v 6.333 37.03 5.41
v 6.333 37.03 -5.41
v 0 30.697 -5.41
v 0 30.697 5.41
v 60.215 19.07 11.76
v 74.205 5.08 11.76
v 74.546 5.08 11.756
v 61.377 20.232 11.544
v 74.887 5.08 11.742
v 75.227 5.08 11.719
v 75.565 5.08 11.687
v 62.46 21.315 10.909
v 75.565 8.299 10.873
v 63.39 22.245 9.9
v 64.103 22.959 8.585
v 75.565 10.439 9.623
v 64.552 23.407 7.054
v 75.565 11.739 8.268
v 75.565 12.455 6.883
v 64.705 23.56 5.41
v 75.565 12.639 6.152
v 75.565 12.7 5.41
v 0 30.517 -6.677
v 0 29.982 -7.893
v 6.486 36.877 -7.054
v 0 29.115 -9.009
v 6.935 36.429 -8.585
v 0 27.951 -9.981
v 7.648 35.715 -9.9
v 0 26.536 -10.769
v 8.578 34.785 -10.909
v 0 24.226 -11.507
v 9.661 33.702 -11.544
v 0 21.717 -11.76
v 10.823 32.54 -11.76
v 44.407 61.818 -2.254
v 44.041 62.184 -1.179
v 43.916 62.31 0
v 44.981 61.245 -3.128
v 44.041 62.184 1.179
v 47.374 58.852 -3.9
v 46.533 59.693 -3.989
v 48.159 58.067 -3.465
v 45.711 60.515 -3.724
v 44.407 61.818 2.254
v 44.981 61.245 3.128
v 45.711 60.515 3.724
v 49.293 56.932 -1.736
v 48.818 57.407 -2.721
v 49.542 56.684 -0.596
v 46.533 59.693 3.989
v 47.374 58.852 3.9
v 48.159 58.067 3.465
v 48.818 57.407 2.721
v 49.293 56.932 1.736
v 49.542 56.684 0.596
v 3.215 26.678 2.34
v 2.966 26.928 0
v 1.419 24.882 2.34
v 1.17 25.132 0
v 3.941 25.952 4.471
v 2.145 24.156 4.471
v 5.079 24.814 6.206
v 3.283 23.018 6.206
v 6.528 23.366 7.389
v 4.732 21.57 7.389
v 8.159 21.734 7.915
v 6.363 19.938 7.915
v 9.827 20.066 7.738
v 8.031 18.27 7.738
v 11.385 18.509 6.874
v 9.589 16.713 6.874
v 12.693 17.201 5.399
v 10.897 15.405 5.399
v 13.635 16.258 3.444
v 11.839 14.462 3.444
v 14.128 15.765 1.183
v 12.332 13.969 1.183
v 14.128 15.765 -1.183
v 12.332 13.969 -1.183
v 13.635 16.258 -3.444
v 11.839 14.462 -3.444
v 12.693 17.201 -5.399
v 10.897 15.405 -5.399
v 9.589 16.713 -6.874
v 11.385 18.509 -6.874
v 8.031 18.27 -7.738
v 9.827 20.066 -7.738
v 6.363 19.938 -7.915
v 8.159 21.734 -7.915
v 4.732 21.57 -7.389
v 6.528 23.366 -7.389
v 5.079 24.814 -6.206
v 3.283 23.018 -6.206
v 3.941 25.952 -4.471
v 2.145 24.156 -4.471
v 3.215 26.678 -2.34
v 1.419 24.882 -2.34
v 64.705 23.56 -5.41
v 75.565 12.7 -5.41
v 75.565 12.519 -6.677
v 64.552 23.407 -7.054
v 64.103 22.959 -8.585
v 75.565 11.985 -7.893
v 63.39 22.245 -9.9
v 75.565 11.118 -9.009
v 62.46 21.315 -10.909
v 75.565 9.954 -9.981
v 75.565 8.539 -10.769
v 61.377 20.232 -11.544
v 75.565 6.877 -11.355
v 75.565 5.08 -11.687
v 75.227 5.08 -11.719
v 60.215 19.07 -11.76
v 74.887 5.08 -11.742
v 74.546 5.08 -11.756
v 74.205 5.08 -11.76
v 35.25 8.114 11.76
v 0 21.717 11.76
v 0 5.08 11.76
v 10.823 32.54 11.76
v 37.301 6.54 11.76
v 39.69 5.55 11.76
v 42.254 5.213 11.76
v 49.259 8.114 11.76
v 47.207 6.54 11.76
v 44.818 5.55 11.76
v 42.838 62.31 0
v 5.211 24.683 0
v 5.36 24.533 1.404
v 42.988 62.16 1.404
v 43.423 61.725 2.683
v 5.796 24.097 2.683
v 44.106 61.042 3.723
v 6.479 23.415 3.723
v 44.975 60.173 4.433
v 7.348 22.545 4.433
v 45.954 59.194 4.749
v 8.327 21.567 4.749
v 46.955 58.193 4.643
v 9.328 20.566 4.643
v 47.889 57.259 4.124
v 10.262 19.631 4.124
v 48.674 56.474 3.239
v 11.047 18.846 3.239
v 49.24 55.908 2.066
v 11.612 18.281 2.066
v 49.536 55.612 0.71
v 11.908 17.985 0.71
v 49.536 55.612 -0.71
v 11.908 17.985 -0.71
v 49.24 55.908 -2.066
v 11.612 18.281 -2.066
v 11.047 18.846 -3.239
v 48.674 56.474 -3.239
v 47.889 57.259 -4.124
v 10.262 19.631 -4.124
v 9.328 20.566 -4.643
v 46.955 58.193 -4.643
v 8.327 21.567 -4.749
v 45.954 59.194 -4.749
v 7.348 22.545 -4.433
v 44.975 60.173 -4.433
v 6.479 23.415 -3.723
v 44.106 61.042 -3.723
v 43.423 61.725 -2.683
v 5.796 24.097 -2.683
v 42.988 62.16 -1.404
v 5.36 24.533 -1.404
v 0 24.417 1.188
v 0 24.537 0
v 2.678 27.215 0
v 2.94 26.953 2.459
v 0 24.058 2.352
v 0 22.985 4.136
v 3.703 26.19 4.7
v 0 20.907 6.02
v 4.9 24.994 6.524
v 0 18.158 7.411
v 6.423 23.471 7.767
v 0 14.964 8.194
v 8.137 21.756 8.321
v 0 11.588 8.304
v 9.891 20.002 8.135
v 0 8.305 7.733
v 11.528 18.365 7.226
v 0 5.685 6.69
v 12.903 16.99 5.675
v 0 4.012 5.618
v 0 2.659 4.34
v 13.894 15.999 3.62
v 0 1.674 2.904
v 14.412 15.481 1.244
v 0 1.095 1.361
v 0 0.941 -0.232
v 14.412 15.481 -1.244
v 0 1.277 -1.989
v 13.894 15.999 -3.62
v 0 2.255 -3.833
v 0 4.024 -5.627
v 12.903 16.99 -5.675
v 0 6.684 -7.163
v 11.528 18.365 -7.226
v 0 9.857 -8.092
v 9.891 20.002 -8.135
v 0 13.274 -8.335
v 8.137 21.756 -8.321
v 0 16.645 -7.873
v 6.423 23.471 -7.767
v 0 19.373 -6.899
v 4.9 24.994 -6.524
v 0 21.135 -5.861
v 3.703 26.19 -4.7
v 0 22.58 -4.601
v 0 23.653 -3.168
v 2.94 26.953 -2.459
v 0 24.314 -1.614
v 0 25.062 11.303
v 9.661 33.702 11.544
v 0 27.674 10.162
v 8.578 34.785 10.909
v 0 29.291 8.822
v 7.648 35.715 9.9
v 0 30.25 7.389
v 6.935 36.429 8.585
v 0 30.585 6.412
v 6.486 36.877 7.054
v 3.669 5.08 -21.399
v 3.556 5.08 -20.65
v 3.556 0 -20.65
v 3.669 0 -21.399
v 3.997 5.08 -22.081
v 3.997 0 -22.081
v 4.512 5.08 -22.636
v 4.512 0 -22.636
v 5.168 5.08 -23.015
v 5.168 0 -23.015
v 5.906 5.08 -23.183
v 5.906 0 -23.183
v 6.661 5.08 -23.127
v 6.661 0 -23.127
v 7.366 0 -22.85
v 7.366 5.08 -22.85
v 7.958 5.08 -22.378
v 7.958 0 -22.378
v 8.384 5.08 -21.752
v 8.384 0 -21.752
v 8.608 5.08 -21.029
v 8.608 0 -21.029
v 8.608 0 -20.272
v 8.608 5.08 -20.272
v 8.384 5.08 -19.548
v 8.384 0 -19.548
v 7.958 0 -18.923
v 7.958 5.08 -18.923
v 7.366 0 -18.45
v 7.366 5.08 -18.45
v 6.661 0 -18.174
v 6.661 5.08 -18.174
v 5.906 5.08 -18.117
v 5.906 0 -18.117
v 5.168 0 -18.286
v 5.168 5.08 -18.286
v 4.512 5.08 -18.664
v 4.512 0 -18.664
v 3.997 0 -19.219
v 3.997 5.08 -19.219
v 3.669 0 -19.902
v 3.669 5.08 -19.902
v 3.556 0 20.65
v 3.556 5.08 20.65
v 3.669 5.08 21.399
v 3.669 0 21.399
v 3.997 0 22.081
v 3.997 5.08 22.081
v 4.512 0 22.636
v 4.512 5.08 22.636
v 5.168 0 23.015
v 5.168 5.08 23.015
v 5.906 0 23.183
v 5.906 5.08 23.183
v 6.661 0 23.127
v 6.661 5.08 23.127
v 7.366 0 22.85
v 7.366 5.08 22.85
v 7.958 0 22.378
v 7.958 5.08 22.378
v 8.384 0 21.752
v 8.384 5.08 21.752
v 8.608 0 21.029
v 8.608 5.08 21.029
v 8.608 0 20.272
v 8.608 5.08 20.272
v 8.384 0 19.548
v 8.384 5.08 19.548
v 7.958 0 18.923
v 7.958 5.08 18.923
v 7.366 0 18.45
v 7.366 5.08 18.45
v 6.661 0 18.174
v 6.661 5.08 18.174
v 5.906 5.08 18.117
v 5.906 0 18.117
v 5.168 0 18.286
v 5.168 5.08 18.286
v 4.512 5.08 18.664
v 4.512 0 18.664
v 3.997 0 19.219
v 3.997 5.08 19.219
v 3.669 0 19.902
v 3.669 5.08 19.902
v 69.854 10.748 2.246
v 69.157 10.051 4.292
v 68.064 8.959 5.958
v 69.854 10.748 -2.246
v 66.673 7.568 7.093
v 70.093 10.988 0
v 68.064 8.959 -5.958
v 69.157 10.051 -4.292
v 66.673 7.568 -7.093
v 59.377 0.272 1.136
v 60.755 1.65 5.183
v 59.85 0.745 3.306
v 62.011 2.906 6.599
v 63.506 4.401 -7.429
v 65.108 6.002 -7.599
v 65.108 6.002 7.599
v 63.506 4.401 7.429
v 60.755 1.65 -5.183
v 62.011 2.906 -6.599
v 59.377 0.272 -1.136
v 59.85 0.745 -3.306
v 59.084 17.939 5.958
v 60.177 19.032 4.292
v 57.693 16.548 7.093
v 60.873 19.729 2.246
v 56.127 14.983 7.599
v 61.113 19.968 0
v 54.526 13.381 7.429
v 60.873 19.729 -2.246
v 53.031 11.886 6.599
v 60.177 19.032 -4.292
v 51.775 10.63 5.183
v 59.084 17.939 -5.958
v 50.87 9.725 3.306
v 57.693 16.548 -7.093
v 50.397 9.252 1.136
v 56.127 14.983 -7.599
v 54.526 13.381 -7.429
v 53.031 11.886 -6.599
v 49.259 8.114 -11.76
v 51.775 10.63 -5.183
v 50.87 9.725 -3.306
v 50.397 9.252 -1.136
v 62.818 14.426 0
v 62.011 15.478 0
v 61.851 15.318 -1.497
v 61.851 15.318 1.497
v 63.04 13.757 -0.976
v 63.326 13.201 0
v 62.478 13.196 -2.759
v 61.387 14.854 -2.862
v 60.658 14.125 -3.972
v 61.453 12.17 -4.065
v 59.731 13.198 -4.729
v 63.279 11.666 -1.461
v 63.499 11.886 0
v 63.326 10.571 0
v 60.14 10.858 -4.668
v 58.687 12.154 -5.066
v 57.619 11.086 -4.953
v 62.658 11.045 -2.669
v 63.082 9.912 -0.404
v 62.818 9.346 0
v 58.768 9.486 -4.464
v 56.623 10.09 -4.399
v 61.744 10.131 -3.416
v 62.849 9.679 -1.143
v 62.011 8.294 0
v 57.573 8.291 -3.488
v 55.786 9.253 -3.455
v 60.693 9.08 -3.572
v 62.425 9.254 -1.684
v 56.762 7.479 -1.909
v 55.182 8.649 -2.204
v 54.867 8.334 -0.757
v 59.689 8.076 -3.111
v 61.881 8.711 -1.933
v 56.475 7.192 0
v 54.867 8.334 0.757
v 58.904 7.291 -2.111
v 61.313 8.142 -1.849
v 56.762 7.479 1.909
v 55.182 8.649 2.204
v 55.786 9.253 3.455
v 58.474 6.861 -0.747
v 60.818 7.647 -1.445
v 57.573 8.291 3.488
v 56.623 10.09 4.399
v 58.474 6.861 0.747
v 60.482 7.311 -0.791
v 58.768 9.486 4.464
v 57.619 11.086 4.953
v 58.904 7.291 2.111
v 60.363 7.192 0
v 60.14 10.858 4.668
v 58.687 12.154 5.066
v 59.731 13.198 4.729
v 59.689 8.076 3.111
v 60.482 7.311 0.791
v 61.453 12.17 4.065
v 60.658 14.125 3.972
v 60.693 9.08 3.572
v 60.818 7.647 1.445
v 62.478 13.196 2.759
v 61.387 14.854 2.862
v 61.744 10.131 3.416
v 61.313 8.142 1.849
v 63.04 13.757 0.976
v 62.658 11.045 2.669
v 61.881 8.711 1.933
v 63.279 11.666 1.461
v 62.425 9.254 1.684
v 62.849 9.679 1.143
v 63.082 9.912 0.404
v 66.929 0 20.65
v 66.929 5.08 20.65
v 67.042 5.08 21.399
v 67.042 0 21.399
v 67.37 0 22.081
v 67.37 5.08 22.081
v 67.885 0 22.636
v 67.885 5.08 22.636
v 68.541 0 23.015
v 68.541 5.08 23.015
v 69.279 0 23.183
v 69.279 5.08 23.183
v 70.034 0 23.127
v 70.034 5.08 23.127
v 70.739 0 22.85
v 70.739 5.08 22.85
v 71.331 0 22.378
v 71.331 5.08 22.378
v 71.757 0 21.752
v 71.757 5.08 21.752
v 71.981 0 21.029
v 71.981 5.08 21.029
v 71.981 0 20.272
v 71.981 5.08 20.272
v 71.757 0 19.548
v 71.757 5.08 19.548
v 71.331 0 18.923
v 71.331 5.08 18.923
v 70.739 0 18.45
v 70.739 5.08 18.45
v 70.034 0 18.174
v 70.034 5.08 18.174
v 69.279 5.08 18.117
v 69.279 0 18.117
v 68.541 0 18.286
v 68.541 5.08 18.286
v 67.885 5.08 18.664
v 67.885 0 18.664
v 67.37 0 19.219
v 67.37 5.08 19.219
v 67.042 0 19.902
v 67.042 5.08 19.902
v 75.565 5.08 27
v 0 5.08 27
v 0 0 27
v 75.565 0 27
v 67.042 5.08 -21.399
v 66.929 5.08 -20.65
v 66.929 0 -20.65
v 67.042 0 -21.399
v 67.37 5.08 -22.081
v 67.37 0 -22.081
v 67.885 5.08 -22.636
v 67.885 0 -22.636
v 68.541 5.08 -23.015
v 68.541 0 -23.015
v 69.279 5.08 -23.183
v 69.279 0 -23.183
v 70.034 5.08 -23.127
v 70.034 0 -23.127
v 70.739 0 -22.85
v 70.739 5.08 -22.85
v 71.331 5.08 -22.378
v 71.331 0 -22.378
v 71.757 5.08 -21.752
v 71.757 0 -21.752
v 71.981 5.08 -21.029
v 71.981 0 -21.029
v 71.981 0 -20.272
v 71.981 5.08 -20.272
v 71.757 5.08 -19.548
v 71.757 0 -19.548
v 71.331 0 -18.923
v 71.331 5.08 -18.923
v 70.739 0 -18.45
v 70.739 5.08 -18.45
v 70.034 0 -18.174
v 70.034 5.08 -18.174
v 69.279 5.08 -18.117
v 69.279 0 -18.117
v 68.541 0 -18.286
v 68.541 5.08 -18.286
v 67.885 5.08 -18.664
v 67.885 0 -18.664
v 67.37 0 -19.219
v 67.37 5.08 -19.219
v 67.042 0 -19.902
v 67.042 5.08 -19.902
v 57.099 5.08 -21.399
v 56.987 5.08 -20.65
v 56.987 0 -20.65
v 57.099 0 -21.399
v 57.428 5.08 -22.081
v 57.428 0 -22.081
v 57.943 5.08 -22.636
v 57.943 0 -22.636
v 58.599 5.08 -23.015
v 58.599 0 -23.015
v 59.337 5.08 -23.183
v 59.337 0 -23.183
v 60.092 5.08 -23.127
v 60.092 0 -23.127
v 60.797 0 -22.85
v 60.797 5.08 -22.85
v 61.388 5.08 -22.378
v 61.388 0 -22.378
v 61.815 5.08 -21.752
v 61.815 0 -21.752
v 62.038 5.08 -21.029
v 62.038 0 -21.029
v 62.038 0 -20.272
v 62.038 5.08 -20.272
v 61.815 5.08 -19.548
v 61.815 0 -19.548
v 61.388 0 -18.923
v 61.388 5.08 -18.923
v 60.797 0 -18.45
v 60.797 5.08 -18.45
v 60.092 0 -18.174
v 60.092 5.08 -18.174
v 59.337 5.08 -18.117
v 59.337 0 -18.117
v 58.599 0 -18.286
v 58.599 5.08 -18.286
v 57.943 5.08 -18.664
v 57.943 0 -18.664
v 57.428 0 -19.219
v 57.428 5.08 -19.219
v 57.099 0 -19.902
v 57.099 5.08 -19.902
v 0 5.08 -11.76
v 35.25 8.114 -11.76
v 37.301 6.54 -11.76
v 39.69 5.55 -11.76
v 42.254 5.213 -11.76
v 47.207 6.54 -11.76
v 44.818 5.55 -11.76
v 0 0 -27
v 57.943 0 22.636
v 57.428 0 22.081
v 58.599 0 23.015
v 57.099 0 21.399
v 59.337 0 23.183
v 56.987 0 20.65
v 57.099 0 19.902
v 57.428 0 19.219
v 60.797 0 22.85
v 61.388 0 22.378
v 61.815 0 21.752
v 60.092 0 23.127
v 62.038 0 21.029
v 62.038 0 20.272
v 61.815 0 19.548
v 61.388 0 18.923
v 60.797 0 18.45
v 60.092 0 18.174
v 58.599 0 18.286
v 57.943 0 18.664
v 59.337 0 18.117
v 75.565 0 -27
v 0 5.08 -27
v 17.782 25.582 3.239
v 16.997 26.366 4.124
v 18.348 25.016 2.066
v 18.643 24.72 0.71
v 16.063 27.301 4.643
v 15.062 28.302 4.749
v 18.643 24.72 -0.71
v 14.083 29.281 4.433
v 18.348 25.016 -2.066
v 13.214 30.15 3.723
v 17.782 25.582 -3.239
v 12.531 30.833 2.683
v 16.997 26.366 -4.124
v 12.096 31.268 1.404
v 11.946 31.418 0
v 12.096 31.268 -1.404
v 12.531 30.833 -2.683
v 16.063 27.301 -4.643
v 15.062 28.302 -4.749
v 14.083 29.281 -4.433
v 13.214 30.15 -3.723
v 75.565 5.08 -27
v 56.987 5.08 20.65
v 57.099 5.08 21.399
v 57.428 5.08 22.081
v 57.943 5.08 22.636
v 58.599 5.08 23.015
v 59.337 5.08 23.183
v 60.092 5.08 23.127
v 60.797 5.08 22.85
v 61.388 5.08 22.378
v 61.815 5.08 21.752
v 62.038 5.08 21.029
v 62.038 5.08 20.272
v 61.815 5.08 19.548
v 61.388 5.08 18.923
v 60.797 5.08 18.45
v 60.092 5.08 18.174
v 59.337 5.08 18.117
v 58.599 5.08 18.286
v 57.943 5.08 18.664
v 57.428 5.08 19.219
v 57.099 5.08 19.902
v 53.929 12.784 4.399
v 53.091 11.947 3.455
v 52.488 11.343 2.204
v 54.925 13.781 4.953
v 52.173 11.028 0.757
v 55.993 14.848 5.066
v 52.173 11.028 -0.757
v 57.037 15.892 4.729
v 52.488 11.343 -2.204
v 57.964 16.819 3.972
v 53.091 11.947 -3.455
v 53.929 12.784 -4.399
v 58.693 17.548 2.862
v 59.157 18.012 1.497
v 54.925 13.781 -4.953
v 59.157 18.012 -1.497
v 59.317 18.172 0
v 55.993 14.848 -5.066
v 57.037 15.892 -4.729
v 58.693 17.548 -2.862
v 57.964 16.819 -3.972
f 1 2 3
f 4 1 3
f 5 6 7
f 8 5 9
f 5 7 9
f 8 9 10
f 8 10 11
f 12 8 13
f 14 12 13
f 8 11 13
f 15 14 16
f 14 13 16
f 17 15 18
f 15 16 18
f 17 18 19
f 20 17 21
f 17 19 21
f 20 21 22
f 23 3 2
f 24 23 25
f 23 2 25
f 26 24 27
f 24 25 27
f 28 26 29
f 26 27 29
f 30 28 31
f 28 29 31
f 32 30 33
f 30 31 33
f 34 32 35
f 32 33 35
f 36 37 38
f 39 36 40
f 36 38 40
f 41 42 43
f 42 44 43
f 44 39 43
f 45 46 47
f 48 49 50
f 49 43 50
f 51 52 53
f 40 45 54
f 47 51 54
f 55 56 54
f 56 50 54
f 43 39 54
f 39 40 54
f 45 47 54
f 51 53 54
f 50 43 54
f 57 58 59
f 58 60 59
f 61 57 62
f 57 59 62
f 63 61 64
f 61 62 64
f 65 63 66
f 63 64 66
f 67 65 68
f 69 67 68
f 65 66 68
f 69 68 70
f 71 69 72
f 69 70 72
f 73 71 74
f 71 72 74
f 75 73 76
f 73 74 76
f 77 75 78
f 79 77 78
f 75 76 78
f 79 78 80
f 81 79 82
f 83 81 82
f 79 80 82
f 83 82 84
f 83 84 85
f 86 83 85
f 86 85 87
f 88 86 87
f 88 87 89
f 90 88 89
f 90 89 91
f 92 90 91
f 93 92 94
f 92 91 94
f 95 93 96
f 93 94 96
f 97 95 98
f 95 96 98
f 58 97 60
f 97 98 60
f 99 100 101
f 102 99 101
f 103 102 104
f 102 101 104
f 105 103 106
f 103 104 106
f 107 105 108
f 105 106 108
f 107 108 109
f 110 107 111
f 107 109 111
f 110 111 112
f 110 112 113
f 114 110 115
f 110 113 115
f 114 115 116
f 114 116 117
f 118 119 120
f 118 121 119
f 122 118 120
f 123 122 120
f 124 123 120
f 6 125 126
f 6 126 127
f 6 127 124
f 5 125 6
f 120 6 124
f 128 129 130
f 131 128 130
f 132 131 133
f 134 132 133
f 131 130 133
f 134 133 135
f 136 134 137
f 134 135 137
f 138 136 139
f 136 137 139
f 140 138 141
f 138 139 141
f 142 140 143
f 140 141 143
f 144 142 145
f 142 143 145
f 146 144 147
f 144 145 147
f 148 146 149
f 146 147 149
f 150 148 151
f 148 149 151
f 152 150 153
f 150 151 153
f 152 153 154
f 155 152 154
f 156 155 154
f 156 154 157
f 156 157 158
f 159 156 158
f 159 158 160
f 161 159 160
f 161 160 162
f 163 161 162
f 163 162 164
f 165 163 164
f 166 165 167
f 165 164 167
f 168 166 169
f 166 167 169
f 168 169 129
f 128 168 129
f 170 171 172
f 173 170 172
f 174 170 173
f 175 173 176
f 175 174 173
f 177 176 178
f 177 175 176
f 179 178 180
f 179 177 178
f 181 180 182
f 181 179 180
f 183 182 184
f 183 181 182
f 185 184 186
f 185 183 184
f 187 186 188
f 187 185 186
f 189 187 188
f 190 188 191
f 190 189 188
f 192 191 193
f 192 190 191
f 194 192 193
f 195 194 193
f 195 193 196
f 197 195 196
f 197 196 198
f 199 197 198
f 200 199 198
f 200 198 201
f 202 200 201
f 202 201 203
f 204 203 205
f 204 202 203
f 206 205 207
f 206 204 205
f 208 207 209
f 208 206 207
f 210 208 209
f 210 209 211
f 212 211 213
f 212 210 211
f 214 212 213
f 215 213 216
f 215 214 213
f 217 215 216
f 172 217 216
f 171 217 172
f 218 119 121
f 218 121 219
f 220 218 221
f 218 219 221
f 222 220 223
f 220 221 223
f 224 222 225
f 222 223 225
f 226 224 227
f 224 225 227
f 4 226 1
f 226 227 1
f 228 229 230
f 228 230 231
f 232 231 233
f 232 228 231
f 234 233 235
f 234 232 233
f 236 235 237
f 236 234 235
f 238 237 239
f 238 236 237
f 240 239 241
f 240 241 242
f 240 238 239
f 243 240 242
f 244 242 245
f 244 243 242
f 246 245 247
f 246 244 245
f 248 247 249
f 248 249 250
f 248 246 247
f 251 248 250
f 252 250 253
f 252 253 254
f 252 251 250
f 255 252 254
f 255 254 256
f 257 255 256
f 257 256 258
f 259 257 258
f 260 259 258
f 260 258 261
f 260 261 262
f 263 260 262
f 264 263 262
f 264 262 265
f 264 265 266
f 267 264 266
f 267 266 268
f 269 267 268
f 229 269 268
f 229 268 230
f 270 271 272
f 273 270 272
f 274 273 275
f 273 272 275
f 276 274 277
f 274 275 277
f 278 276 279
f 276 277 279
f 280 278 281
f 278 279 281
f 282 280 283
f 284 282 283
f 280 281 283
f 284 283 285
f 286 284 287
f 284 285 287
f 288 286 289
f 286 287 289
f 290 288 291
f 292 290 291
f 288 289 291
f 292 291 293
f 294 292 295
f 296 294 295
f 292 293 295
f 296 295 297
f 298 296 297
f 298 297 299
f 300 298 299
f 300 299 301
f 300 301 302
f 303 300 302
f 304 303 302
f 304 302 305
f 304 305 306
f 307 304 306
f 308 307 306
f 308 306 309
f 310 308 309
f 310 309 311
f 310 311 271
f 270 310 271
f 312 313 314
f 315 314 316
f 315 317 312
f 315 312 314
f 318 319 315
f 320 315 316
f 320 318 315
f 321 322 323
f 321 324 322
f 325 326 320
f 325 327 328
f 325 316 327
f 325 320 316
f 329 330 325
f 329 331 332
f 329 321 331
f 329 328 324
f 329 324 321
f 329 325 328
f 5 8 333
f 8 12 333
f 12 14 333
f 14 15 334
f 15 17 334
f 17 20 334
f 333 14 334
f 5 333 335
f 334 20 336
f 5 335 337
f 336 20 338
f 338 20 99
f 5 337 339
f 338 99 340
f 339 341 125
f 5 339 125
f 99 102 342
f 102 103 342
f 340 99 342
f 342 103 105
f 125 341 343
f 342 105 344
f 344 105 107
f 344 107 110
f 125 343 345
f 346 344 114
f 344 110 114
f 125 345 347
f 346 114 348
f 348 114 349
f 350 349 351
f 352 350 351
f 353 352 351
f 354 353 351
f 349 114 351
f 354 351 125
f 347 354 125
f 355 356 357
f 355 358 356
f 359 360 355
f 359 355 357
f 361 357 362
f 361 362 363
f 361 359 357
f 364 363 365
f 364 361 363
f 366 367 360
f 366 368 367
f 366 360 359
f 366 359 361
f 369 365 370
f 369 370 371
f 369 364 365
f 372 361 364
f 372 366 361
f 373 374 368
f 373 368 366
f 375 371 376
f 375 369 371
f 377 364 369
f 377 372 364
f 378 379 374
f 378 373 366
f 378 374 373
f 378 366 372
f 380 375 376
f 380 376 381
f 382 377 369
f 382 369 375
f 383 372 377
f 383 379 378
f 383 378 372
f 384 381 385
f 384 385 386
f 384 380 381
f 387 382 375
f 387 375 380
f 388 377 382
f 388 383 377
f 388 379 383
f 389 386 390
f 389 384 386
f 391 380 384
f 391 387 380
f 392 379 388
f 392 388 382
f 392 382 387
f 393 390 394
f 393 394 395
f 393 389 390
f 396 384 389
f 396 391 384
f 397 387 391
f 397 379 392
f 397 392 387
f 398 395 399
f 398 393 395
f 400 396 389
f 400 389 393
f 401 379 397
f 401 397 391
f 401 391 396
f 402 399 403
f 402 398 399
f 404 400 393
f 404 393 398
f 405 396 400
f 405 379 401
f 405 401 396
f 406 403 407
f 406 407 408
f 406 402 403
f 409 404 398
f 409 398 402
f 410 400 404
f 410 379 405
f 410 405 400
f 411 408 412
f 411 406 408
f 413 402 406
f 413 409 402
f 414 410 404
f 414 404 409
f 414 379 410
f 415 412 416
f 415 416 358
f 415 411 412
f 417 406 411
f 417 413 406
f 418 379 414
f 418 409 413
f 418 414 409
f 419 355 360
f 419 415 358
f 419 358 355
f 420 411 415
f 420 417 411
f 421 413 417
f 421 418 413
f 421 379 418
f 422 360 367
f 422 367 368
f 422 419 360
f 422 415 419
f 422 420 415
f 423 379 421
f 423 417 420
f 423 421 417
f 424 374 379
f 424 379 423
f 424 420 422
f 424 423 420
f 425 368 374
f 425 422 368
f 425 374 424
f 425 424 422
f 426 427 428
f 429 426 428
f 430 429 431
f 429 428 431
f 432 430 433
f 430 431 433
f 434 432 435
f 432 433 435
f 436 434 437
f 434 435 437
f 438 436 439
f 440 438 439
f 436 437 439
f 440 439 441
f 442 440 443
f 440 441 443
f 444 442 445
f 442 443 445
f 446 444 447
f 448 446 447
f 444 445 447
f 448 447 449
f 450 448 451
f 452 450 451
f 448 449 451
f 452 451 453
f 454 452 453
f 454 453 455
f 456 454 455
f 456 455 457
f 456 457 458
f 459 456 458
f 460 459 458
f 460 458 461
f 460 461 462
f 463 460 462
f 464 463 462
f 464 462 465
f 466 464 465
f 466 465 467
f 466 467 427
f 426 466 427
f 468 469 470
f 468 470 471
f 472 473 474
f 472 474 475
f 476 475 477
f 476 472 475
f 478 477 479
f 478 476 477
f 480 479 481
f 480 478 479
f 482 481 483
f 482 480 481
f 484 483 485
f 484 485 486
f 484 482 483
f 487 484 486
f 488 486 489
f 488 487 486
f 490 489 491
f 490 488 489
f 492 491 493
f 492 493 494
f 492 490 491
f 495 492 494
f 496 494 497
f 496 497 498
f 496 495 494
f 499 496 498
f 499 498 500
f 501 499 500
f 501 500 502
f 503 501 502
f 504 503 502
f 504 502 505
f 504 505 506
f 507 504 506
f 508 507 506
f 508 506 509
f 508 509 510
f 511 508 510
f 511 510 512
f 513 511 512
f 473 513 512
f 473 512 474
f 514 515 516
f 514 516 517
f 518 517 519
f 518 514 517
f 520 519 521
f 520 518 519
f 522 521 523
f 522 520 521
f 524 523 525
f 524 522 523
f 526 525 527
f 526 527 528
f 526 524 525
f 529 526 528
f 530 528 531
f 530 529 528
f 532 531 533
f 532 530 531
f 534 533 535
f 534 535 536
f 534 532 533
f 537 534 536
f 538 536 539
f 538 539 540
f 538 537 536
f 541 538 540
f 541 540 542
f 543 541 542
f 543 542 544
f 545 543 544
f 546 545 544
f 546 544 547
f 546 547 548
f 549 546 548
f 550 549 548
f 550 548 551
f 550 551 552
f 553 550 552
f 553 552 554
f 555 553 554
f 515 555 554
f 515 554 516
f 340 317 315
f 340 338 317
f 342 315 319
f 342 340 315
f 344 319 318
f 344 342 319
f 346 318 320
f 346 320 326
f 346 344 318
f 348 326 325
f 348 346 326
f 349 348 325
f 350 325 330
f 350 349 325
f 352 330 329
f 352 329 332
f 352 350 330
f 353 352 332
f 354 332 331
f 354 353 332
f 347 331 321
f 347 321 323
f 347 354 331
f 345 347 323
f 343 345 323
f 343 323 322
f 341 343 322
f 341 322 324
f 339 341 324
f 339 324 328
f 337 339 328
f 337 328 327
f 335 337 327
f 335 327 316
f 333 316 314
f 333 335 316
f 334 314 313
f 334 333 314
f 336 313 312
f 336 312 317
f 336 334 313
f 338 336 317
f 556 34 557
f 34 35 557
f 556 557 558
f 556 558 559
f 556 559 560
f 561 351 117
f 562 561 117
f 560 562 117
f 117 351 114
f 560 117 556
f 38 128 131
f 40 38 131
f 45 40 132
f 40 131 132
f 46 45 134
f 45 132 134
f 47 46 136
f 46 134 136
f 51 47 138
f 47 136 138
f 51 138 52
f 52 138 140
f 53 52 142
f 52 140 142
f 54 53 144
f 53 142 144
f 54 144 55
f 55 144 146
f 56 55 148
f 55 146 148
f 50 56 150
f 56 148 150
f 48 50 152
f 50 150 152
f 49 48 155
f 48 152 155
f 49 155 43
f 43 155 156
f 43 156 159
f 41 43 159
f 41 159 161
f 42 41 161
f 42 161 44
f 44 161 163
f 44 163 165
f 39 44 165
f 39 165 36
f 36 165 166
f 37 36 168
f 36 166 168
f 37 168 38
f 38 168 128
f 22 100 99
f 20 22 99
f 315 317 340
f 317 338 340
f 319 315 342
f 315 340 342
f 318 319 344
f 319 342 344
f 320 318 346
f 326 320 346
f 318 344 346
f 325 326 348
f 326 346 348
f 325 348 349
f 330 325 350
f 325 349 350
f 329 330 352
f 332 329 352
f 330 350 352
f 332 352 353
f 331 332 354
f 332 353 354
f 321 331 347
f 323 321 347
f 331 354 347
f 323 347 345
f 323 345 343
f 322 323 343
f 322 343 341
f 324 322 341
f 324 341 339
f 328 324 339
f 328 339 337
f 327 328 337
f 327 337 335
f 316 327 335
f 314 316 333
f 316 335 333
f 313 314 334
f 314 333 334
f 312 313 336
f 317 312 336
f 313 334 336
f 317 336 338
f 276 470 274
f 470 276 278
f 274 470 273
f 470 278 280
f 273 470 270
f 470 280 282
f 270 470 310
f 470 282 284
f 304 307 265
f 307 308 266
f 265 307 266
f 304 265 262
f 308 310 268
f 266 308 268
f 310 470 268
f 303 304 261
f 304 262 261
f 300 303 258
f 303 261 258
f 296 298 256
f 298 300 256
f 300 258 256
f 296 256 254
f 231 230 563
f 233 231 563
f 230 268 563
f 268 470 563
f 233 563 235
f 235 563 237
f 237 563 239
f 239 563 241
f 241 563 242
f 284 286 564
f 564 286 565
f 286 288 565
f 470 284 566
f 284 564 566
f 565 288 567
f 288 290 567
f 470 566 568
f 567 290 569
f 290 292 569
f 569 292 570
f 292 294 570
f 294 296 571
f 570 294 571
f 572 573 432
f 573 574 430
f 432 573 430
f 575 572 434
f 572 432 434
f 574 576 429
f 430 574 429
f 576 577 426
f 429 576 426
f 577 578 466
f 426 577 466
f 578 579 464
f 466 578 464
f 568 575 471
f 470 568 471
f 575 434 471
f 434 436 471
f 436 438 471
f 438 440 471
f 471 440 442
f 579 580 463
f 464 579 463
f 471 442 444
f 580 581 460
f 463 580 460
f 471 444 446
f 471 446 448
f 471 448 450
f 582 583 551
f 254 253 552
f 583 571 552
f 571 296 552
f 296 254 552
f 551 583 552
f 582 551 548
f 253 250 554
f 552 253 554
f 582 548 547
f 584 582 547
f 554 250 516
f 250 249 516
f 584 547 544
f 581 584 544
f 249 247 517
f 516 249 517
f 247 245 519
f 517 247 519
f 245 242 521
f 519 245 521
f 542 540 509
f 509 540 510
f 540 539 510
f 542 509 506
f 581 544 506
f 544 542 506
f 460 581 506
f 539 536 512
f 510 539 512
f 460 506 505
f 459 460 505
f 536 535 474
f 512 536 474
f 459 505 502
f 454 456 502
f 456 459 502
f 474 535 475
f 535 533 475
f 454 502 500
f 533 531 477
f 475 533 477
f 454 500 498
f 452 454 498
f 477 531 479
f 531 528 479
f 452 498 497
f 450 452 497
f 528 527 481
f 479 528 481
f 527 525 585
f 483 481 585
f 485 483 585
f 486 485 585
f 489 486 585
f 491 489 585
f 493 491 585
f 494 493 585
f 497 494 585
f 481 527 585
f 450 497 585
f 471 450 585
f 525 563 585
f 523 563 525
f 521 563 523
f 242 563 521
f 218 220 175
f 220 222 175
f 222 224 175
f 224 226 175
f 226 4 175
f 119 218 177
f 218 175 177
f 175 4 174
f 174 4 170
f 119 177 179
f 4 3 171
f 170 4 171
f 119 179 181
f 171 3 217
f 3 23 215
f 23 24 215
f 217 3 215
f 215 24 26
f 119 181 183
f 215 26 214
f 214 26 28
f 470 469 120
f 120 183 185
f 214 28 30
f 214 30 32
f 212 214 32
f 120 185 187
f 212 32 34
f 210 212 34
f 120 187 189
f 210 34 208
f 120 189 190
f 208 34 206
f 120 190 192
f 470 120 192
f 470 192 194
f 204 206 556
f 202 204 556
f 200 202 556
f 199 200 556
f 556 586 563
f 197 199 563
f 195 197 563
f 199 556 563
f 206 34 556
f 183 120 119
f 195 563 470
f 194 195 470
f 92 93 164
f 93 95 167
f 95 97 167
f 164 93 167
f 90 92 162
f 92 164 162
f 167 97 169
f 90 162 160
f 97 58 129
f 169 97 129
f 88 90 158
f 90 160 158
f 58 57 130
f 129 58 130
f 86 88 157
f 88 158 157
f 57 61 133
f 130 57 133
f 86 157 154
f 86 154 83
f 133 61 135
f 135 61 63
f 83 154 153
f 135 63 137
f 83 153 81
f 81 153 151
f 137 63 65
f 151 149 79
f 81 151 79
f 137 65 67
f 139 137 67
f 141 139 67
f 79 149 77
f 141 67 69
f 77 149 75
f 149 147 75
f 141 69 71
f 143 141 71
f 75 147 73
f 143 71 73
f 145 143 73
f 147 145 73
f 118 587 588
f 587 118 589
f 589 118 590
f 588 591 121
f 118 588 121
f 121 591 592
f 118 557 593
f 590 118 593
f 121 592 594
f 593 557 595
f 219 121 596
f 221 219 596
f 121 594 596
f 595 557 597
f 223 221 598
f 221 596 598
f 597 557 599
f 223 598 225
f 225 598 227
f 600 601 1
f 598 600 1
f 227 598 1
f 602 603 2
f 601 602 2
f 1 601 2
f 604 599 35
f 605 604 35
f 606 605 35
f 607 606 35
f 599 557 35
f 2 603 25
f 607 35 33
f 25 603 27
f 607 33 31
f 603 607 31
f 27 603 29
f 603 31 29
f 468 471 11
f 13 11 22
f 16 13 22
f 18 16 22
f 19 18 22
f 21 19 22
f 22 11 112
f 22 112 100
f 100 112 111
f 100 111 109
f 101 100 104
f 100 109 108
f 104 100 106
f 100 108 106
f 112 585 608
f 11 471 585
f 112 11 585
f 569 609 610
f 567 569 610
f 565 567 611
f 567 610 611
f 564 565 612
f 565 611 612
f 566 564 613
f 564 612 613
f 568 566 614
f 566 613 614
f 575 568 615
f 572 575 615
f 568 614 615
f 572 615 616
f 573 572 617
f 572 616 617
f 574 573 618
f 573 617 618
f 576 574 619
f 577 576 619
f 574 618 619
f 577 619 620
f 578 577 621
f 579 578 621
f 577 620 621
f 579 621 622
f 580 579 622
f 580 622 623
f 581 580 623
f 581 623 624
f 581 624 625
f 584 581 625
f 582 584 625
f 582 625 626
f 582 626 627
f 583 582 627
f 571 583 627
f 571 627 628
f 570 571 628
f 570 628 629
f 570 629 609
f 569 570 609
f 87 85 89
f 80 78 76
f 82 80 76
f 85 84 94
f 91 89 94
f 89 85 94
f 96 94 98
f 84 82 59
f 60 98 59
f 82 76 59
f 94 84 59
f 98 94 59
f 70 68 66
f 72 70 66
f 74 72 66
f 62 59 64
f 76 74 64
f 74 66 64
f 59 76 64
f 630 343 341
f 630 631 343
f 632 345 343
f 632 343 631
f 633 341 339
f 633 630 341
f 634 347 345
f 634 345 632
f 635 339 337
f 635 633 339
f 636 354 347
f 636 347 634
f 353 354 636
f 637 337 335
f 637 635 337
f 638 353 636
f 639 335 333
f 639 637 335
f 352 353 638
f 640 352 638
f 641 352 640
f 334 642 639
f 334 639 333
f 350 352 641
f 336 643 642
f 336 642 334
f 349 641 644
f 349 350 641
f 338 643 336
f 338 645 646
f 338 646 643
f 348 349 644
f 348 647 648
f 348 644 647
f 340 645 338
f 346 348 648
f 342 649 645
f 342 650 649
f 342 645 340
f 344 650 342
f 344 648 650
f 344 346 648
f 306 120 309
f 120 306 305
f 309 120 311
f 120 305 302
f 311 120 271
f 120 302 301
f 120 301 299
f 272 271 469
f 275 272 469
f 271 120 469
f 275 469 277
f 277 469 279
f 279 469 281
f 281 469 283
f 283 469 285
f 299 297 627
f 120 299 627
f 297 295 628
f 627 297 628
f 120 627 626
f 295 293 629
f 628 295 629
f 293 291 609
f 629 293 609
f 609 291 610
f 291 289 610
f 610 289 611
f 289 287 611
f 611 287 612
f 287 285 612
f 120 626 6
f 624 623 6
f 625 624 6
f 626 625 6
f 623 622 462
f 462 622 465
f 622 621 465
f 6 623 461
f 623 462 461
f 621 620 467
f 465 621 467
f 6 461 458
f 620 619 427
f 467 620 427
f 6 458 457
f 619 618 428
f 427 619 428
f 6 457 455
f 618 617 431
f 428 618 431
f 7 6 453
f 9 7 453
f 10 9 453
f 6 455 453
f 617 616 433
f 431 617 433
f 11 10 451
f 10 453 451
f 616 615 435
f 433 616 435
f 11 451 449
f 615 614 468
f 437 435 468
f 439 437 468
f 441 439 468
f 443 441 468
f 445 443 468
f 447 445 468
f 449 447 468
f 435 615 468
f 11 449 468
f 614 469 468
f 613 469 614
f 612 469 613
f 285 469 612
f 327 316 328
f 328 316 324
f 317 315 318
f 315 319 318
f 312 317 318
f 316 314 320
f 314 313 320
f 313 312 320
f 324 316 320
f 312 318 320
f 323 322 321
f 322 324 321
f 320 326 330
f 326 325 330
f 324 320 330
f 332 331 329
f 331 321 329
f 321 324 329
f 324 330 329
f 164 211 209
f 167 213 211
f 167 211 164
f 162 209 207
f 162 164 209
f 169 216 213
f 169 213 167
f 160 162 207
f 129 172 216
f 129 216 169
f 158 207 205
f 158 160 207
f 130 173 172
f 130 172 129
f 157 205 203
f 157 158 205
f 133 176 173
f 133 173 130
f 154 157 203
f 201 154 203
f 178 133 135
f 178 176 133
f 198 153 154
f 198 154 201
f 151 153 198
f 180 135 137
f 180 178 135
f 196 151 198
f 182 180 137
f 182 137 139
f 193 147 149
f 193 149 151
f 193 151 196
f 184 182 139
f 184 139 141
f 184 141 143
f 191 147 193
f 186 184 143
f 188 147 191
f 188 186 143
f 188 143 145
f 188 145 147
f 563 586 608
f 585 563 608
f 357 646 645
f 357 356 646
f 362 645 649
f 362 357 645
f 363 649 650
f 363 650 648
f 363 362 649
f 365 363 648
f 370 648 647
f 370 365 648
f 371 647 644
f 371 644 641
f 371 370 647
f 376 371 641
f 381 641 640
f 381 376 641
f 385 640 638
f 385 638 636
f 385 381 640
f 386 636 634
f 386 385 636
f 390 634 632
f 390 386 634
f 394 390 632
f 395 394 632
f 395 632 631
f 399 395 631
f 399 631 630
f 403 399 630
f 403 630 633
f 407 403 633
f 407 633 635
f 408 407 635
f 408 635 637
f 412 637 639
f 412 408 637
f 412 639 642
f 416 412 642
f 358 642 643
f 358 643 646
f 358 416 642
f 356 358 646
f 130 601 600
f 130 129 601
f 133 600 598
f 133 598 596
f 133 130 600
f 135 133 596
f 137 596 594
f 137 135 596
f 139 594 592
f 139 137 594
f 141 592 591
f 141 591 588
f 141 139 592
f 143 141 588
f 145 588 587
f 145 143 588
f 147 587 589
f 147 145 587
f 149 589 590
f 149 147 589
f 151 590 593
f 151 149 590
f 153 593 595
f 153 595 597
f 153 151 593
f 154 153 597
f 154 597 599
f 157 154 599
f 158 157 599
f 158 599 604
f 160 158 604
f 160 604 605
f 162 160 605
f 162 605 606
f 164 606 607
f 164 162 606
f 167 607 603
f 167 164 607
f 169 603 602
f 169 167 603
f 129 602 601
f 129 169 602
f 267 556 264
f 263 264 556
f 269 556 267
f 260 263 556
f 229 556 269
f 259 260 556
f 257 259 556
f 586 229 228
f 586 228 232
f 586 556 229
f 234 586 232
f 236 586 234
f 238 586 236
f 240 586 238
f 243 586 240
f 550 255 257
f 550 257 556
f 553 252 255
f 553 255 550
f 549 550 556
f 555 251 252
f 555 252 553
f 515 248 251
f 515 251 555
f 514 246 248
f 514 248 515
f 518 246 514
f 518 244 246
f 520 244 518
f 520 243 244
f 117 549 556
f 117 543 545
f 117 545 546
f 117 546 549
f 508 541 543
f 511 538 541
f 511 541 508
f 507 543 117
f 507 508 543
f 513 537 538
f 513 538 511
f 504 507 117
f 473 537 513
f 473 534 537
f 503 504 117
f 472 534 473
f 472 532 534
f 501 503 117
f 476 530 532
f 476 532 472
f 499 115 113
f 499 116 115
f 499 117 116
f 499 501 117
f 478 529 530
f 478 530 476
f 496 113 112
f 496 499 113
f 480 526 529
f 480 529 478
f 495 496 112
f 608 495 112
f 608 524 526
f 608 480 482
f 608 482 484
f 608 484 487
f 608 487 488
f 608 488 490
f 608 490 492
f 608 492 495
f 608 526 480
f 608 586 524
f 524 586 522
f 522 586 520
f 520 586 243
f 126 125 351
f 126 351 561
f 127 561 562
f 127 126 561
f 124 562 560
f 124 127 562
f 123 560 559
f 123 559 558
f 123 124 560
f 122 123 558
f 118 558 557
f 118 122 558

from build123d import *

# Parameters (mm, degrees)
F1_DEPTH = 27.0002
F2_R     = 9.906
F3_W     = 75.565
F3_H     = 31.9504877579
F4_DEPTH = 15.24
F5_R     = 2.54
F6_DEPTH = 5.081
F8_R     = 6.35
F14_SIZE = 0.762


with BuildPart() as f1:
    # F0 (on Top) → F1 (new body)
    with BuildSketch(Plane.XY):
        Polygon((64.7048964237, 23.5601035763), (42.2542561211, 1.1094632736), (6.3332316368, 37.0304877579), (0, 30.6972561211), (0, 0), (75.565, 0), (75.565, 12.7), align=None)
    extrude(amount=-F1_DEPTH)

    # F2
    f2_edges = [f1.edges().sort_by_distance(p)[0] for p in [
        (42.254256, 1.109463, -13.5001),
    ]]
    fillet(f2_edges, radius=F2_R)

    # F3 (on Top) → F4 (cut)
    with BuildSketch(Plane.XY):
        with Locations((37.7825, 21.0552438789)):
            Rectangle(F3_W, F3_H)
    extrude(amount=-F4_DEPTH, mode=Mode.SUBTRACT)

    # F5 (on face) → F6 (cut, through all)
    with BuildSketch(Plane(origin=(0, 5.08, 0), x_dir=(-1, 0, 0), z_dir=(0, 1, 0))):
        with Locations((-69.469, -6.35)):
            Circle(F5_R)
        with Locations((-59.5265105367, -6.35)):
            Circle(F5_R)
        with Locations((-6.096, -6.35)):
            Circle(F5_R)
    extrude(amount=-F6_DEPTH, mode=Mode.SUBTRACT)

    # F7: F1 across face


with BuildPart() as f1_1:
    add(f1.part)
    add(f1.part.mirror(Plane(origin=(31.4297936493, 11.6265989231, -27.0002), x_dir=(1, 0, 0), z_dir=(0, 0, -1))))

    # F8
    f8_edges = [f1_1.edges().sort_by_distance(p)[0] for p in [
        (70.134948, 18.130052, -38.7604),
        (70.134948, 18.130052, -15.24),
        (3.166616, 33.863872, -38.7604),
        (3.166616, 33.863872, -15.24),
    ]]
    fillet(f8_edges, radius=F8_R)


with BuildPart() as f1_2:
    # F10: moved
    add(f1_1.part.moved(Location((0, 0, 27.0002))))

    # F9 (on Top) → F11 (revolve, cut)
    with BuildSketch(Plane.XY):
        Polygon((-6.3683719395, 6.3683719395), (15.3134877579, 28.0502316368), (11.9458917125, 31.4178276822), (5.2106996217, 24.6826355914), (2.6782673955, 27.2150678175), (-12.268400211, 12.268400211), align=None)
    revolve(axis=Axis((22.0486798487, 34.7854237276, 0), (0.7071067812, 0.7071067812, 0)), mode=Mode.SUBTRACT)

    # F15 (on Top) → F16 (revolve, cut)
    with BuildSketch(Plane.XY):
        Polygon((64.7048964237, 5.5995913341), (70.0930500964, 10.9877450068), (61.1127939753, 19.9680011278), (55.7246403027, 14.5798474552), align=None)
    revolve(axis=Axis((60.2147683632, 10.0897193947, 0), (-0.7071067812, 0.7071067812, 0)), mode=Mode.SUBTRACT)


with BuildPart() as f13:
    # F12 (on Top) → F13 (revolve)
    with BuildSketch(Plane.XY):
        Polygon((5.2106996217, 24.6826355914), (2.9656355914, 26.9276996217), (1.1695843672, 25.1316483974), (6.7822444428, 19.5189883218), (46.7443841816, 59.4811280605), (43.3767881362, 62.8487241059), (11.9458917125, 31.4178276822), align=None)
    revolve(axis=Axis((26.7633143122, 39.5000581912, 0), (0.7071067812, 0.7071067812, 0)))

    # F14
    f14_edges = [f13.edges().sort_by_distance(p)[0] for p in [
        (50.11198, 56.113532, 0),
    ]]
    chamfer(f14_edges, length=F14_SIZE)


with BuildPart() as f19:
    # F18 (on Top) → F19 (revolve)
    with BuildSketch(Plane.XY):
        with BuildLine():
            Line((62.0108195874, 8.2936681704), (64.7048964237, 5.5995913341))
            Line((64.7048964237, 5.5995913341), (70.0930500964, 10.9877450068))
            Line((70.0930500964, 10.9877450068), (61.1127939753, 19.9680011278))
            Line((61.1127939753, 19.9680011278), (60.2147683632, 19.0699755157))
            Line((60.2147683632, 19.0699755157), (59.3167427511, 18.1719499036))
            Line((59.3167427511, 18.1719499036), (62.0108195874, 15.4778730673))
            ThreePointArc((62.0108195874, 15.4778730673), (63.498717139, 11.8857706189), (62.0108195874, 8.2936681704))
        make_face()
    revolve(axis=Axis((40.0091920908, 30.2952956671, 0), (-0.7071067812, 0.7071067812, 0)))


solid = Compound([f1_2.part, f13.part, f19.part])
